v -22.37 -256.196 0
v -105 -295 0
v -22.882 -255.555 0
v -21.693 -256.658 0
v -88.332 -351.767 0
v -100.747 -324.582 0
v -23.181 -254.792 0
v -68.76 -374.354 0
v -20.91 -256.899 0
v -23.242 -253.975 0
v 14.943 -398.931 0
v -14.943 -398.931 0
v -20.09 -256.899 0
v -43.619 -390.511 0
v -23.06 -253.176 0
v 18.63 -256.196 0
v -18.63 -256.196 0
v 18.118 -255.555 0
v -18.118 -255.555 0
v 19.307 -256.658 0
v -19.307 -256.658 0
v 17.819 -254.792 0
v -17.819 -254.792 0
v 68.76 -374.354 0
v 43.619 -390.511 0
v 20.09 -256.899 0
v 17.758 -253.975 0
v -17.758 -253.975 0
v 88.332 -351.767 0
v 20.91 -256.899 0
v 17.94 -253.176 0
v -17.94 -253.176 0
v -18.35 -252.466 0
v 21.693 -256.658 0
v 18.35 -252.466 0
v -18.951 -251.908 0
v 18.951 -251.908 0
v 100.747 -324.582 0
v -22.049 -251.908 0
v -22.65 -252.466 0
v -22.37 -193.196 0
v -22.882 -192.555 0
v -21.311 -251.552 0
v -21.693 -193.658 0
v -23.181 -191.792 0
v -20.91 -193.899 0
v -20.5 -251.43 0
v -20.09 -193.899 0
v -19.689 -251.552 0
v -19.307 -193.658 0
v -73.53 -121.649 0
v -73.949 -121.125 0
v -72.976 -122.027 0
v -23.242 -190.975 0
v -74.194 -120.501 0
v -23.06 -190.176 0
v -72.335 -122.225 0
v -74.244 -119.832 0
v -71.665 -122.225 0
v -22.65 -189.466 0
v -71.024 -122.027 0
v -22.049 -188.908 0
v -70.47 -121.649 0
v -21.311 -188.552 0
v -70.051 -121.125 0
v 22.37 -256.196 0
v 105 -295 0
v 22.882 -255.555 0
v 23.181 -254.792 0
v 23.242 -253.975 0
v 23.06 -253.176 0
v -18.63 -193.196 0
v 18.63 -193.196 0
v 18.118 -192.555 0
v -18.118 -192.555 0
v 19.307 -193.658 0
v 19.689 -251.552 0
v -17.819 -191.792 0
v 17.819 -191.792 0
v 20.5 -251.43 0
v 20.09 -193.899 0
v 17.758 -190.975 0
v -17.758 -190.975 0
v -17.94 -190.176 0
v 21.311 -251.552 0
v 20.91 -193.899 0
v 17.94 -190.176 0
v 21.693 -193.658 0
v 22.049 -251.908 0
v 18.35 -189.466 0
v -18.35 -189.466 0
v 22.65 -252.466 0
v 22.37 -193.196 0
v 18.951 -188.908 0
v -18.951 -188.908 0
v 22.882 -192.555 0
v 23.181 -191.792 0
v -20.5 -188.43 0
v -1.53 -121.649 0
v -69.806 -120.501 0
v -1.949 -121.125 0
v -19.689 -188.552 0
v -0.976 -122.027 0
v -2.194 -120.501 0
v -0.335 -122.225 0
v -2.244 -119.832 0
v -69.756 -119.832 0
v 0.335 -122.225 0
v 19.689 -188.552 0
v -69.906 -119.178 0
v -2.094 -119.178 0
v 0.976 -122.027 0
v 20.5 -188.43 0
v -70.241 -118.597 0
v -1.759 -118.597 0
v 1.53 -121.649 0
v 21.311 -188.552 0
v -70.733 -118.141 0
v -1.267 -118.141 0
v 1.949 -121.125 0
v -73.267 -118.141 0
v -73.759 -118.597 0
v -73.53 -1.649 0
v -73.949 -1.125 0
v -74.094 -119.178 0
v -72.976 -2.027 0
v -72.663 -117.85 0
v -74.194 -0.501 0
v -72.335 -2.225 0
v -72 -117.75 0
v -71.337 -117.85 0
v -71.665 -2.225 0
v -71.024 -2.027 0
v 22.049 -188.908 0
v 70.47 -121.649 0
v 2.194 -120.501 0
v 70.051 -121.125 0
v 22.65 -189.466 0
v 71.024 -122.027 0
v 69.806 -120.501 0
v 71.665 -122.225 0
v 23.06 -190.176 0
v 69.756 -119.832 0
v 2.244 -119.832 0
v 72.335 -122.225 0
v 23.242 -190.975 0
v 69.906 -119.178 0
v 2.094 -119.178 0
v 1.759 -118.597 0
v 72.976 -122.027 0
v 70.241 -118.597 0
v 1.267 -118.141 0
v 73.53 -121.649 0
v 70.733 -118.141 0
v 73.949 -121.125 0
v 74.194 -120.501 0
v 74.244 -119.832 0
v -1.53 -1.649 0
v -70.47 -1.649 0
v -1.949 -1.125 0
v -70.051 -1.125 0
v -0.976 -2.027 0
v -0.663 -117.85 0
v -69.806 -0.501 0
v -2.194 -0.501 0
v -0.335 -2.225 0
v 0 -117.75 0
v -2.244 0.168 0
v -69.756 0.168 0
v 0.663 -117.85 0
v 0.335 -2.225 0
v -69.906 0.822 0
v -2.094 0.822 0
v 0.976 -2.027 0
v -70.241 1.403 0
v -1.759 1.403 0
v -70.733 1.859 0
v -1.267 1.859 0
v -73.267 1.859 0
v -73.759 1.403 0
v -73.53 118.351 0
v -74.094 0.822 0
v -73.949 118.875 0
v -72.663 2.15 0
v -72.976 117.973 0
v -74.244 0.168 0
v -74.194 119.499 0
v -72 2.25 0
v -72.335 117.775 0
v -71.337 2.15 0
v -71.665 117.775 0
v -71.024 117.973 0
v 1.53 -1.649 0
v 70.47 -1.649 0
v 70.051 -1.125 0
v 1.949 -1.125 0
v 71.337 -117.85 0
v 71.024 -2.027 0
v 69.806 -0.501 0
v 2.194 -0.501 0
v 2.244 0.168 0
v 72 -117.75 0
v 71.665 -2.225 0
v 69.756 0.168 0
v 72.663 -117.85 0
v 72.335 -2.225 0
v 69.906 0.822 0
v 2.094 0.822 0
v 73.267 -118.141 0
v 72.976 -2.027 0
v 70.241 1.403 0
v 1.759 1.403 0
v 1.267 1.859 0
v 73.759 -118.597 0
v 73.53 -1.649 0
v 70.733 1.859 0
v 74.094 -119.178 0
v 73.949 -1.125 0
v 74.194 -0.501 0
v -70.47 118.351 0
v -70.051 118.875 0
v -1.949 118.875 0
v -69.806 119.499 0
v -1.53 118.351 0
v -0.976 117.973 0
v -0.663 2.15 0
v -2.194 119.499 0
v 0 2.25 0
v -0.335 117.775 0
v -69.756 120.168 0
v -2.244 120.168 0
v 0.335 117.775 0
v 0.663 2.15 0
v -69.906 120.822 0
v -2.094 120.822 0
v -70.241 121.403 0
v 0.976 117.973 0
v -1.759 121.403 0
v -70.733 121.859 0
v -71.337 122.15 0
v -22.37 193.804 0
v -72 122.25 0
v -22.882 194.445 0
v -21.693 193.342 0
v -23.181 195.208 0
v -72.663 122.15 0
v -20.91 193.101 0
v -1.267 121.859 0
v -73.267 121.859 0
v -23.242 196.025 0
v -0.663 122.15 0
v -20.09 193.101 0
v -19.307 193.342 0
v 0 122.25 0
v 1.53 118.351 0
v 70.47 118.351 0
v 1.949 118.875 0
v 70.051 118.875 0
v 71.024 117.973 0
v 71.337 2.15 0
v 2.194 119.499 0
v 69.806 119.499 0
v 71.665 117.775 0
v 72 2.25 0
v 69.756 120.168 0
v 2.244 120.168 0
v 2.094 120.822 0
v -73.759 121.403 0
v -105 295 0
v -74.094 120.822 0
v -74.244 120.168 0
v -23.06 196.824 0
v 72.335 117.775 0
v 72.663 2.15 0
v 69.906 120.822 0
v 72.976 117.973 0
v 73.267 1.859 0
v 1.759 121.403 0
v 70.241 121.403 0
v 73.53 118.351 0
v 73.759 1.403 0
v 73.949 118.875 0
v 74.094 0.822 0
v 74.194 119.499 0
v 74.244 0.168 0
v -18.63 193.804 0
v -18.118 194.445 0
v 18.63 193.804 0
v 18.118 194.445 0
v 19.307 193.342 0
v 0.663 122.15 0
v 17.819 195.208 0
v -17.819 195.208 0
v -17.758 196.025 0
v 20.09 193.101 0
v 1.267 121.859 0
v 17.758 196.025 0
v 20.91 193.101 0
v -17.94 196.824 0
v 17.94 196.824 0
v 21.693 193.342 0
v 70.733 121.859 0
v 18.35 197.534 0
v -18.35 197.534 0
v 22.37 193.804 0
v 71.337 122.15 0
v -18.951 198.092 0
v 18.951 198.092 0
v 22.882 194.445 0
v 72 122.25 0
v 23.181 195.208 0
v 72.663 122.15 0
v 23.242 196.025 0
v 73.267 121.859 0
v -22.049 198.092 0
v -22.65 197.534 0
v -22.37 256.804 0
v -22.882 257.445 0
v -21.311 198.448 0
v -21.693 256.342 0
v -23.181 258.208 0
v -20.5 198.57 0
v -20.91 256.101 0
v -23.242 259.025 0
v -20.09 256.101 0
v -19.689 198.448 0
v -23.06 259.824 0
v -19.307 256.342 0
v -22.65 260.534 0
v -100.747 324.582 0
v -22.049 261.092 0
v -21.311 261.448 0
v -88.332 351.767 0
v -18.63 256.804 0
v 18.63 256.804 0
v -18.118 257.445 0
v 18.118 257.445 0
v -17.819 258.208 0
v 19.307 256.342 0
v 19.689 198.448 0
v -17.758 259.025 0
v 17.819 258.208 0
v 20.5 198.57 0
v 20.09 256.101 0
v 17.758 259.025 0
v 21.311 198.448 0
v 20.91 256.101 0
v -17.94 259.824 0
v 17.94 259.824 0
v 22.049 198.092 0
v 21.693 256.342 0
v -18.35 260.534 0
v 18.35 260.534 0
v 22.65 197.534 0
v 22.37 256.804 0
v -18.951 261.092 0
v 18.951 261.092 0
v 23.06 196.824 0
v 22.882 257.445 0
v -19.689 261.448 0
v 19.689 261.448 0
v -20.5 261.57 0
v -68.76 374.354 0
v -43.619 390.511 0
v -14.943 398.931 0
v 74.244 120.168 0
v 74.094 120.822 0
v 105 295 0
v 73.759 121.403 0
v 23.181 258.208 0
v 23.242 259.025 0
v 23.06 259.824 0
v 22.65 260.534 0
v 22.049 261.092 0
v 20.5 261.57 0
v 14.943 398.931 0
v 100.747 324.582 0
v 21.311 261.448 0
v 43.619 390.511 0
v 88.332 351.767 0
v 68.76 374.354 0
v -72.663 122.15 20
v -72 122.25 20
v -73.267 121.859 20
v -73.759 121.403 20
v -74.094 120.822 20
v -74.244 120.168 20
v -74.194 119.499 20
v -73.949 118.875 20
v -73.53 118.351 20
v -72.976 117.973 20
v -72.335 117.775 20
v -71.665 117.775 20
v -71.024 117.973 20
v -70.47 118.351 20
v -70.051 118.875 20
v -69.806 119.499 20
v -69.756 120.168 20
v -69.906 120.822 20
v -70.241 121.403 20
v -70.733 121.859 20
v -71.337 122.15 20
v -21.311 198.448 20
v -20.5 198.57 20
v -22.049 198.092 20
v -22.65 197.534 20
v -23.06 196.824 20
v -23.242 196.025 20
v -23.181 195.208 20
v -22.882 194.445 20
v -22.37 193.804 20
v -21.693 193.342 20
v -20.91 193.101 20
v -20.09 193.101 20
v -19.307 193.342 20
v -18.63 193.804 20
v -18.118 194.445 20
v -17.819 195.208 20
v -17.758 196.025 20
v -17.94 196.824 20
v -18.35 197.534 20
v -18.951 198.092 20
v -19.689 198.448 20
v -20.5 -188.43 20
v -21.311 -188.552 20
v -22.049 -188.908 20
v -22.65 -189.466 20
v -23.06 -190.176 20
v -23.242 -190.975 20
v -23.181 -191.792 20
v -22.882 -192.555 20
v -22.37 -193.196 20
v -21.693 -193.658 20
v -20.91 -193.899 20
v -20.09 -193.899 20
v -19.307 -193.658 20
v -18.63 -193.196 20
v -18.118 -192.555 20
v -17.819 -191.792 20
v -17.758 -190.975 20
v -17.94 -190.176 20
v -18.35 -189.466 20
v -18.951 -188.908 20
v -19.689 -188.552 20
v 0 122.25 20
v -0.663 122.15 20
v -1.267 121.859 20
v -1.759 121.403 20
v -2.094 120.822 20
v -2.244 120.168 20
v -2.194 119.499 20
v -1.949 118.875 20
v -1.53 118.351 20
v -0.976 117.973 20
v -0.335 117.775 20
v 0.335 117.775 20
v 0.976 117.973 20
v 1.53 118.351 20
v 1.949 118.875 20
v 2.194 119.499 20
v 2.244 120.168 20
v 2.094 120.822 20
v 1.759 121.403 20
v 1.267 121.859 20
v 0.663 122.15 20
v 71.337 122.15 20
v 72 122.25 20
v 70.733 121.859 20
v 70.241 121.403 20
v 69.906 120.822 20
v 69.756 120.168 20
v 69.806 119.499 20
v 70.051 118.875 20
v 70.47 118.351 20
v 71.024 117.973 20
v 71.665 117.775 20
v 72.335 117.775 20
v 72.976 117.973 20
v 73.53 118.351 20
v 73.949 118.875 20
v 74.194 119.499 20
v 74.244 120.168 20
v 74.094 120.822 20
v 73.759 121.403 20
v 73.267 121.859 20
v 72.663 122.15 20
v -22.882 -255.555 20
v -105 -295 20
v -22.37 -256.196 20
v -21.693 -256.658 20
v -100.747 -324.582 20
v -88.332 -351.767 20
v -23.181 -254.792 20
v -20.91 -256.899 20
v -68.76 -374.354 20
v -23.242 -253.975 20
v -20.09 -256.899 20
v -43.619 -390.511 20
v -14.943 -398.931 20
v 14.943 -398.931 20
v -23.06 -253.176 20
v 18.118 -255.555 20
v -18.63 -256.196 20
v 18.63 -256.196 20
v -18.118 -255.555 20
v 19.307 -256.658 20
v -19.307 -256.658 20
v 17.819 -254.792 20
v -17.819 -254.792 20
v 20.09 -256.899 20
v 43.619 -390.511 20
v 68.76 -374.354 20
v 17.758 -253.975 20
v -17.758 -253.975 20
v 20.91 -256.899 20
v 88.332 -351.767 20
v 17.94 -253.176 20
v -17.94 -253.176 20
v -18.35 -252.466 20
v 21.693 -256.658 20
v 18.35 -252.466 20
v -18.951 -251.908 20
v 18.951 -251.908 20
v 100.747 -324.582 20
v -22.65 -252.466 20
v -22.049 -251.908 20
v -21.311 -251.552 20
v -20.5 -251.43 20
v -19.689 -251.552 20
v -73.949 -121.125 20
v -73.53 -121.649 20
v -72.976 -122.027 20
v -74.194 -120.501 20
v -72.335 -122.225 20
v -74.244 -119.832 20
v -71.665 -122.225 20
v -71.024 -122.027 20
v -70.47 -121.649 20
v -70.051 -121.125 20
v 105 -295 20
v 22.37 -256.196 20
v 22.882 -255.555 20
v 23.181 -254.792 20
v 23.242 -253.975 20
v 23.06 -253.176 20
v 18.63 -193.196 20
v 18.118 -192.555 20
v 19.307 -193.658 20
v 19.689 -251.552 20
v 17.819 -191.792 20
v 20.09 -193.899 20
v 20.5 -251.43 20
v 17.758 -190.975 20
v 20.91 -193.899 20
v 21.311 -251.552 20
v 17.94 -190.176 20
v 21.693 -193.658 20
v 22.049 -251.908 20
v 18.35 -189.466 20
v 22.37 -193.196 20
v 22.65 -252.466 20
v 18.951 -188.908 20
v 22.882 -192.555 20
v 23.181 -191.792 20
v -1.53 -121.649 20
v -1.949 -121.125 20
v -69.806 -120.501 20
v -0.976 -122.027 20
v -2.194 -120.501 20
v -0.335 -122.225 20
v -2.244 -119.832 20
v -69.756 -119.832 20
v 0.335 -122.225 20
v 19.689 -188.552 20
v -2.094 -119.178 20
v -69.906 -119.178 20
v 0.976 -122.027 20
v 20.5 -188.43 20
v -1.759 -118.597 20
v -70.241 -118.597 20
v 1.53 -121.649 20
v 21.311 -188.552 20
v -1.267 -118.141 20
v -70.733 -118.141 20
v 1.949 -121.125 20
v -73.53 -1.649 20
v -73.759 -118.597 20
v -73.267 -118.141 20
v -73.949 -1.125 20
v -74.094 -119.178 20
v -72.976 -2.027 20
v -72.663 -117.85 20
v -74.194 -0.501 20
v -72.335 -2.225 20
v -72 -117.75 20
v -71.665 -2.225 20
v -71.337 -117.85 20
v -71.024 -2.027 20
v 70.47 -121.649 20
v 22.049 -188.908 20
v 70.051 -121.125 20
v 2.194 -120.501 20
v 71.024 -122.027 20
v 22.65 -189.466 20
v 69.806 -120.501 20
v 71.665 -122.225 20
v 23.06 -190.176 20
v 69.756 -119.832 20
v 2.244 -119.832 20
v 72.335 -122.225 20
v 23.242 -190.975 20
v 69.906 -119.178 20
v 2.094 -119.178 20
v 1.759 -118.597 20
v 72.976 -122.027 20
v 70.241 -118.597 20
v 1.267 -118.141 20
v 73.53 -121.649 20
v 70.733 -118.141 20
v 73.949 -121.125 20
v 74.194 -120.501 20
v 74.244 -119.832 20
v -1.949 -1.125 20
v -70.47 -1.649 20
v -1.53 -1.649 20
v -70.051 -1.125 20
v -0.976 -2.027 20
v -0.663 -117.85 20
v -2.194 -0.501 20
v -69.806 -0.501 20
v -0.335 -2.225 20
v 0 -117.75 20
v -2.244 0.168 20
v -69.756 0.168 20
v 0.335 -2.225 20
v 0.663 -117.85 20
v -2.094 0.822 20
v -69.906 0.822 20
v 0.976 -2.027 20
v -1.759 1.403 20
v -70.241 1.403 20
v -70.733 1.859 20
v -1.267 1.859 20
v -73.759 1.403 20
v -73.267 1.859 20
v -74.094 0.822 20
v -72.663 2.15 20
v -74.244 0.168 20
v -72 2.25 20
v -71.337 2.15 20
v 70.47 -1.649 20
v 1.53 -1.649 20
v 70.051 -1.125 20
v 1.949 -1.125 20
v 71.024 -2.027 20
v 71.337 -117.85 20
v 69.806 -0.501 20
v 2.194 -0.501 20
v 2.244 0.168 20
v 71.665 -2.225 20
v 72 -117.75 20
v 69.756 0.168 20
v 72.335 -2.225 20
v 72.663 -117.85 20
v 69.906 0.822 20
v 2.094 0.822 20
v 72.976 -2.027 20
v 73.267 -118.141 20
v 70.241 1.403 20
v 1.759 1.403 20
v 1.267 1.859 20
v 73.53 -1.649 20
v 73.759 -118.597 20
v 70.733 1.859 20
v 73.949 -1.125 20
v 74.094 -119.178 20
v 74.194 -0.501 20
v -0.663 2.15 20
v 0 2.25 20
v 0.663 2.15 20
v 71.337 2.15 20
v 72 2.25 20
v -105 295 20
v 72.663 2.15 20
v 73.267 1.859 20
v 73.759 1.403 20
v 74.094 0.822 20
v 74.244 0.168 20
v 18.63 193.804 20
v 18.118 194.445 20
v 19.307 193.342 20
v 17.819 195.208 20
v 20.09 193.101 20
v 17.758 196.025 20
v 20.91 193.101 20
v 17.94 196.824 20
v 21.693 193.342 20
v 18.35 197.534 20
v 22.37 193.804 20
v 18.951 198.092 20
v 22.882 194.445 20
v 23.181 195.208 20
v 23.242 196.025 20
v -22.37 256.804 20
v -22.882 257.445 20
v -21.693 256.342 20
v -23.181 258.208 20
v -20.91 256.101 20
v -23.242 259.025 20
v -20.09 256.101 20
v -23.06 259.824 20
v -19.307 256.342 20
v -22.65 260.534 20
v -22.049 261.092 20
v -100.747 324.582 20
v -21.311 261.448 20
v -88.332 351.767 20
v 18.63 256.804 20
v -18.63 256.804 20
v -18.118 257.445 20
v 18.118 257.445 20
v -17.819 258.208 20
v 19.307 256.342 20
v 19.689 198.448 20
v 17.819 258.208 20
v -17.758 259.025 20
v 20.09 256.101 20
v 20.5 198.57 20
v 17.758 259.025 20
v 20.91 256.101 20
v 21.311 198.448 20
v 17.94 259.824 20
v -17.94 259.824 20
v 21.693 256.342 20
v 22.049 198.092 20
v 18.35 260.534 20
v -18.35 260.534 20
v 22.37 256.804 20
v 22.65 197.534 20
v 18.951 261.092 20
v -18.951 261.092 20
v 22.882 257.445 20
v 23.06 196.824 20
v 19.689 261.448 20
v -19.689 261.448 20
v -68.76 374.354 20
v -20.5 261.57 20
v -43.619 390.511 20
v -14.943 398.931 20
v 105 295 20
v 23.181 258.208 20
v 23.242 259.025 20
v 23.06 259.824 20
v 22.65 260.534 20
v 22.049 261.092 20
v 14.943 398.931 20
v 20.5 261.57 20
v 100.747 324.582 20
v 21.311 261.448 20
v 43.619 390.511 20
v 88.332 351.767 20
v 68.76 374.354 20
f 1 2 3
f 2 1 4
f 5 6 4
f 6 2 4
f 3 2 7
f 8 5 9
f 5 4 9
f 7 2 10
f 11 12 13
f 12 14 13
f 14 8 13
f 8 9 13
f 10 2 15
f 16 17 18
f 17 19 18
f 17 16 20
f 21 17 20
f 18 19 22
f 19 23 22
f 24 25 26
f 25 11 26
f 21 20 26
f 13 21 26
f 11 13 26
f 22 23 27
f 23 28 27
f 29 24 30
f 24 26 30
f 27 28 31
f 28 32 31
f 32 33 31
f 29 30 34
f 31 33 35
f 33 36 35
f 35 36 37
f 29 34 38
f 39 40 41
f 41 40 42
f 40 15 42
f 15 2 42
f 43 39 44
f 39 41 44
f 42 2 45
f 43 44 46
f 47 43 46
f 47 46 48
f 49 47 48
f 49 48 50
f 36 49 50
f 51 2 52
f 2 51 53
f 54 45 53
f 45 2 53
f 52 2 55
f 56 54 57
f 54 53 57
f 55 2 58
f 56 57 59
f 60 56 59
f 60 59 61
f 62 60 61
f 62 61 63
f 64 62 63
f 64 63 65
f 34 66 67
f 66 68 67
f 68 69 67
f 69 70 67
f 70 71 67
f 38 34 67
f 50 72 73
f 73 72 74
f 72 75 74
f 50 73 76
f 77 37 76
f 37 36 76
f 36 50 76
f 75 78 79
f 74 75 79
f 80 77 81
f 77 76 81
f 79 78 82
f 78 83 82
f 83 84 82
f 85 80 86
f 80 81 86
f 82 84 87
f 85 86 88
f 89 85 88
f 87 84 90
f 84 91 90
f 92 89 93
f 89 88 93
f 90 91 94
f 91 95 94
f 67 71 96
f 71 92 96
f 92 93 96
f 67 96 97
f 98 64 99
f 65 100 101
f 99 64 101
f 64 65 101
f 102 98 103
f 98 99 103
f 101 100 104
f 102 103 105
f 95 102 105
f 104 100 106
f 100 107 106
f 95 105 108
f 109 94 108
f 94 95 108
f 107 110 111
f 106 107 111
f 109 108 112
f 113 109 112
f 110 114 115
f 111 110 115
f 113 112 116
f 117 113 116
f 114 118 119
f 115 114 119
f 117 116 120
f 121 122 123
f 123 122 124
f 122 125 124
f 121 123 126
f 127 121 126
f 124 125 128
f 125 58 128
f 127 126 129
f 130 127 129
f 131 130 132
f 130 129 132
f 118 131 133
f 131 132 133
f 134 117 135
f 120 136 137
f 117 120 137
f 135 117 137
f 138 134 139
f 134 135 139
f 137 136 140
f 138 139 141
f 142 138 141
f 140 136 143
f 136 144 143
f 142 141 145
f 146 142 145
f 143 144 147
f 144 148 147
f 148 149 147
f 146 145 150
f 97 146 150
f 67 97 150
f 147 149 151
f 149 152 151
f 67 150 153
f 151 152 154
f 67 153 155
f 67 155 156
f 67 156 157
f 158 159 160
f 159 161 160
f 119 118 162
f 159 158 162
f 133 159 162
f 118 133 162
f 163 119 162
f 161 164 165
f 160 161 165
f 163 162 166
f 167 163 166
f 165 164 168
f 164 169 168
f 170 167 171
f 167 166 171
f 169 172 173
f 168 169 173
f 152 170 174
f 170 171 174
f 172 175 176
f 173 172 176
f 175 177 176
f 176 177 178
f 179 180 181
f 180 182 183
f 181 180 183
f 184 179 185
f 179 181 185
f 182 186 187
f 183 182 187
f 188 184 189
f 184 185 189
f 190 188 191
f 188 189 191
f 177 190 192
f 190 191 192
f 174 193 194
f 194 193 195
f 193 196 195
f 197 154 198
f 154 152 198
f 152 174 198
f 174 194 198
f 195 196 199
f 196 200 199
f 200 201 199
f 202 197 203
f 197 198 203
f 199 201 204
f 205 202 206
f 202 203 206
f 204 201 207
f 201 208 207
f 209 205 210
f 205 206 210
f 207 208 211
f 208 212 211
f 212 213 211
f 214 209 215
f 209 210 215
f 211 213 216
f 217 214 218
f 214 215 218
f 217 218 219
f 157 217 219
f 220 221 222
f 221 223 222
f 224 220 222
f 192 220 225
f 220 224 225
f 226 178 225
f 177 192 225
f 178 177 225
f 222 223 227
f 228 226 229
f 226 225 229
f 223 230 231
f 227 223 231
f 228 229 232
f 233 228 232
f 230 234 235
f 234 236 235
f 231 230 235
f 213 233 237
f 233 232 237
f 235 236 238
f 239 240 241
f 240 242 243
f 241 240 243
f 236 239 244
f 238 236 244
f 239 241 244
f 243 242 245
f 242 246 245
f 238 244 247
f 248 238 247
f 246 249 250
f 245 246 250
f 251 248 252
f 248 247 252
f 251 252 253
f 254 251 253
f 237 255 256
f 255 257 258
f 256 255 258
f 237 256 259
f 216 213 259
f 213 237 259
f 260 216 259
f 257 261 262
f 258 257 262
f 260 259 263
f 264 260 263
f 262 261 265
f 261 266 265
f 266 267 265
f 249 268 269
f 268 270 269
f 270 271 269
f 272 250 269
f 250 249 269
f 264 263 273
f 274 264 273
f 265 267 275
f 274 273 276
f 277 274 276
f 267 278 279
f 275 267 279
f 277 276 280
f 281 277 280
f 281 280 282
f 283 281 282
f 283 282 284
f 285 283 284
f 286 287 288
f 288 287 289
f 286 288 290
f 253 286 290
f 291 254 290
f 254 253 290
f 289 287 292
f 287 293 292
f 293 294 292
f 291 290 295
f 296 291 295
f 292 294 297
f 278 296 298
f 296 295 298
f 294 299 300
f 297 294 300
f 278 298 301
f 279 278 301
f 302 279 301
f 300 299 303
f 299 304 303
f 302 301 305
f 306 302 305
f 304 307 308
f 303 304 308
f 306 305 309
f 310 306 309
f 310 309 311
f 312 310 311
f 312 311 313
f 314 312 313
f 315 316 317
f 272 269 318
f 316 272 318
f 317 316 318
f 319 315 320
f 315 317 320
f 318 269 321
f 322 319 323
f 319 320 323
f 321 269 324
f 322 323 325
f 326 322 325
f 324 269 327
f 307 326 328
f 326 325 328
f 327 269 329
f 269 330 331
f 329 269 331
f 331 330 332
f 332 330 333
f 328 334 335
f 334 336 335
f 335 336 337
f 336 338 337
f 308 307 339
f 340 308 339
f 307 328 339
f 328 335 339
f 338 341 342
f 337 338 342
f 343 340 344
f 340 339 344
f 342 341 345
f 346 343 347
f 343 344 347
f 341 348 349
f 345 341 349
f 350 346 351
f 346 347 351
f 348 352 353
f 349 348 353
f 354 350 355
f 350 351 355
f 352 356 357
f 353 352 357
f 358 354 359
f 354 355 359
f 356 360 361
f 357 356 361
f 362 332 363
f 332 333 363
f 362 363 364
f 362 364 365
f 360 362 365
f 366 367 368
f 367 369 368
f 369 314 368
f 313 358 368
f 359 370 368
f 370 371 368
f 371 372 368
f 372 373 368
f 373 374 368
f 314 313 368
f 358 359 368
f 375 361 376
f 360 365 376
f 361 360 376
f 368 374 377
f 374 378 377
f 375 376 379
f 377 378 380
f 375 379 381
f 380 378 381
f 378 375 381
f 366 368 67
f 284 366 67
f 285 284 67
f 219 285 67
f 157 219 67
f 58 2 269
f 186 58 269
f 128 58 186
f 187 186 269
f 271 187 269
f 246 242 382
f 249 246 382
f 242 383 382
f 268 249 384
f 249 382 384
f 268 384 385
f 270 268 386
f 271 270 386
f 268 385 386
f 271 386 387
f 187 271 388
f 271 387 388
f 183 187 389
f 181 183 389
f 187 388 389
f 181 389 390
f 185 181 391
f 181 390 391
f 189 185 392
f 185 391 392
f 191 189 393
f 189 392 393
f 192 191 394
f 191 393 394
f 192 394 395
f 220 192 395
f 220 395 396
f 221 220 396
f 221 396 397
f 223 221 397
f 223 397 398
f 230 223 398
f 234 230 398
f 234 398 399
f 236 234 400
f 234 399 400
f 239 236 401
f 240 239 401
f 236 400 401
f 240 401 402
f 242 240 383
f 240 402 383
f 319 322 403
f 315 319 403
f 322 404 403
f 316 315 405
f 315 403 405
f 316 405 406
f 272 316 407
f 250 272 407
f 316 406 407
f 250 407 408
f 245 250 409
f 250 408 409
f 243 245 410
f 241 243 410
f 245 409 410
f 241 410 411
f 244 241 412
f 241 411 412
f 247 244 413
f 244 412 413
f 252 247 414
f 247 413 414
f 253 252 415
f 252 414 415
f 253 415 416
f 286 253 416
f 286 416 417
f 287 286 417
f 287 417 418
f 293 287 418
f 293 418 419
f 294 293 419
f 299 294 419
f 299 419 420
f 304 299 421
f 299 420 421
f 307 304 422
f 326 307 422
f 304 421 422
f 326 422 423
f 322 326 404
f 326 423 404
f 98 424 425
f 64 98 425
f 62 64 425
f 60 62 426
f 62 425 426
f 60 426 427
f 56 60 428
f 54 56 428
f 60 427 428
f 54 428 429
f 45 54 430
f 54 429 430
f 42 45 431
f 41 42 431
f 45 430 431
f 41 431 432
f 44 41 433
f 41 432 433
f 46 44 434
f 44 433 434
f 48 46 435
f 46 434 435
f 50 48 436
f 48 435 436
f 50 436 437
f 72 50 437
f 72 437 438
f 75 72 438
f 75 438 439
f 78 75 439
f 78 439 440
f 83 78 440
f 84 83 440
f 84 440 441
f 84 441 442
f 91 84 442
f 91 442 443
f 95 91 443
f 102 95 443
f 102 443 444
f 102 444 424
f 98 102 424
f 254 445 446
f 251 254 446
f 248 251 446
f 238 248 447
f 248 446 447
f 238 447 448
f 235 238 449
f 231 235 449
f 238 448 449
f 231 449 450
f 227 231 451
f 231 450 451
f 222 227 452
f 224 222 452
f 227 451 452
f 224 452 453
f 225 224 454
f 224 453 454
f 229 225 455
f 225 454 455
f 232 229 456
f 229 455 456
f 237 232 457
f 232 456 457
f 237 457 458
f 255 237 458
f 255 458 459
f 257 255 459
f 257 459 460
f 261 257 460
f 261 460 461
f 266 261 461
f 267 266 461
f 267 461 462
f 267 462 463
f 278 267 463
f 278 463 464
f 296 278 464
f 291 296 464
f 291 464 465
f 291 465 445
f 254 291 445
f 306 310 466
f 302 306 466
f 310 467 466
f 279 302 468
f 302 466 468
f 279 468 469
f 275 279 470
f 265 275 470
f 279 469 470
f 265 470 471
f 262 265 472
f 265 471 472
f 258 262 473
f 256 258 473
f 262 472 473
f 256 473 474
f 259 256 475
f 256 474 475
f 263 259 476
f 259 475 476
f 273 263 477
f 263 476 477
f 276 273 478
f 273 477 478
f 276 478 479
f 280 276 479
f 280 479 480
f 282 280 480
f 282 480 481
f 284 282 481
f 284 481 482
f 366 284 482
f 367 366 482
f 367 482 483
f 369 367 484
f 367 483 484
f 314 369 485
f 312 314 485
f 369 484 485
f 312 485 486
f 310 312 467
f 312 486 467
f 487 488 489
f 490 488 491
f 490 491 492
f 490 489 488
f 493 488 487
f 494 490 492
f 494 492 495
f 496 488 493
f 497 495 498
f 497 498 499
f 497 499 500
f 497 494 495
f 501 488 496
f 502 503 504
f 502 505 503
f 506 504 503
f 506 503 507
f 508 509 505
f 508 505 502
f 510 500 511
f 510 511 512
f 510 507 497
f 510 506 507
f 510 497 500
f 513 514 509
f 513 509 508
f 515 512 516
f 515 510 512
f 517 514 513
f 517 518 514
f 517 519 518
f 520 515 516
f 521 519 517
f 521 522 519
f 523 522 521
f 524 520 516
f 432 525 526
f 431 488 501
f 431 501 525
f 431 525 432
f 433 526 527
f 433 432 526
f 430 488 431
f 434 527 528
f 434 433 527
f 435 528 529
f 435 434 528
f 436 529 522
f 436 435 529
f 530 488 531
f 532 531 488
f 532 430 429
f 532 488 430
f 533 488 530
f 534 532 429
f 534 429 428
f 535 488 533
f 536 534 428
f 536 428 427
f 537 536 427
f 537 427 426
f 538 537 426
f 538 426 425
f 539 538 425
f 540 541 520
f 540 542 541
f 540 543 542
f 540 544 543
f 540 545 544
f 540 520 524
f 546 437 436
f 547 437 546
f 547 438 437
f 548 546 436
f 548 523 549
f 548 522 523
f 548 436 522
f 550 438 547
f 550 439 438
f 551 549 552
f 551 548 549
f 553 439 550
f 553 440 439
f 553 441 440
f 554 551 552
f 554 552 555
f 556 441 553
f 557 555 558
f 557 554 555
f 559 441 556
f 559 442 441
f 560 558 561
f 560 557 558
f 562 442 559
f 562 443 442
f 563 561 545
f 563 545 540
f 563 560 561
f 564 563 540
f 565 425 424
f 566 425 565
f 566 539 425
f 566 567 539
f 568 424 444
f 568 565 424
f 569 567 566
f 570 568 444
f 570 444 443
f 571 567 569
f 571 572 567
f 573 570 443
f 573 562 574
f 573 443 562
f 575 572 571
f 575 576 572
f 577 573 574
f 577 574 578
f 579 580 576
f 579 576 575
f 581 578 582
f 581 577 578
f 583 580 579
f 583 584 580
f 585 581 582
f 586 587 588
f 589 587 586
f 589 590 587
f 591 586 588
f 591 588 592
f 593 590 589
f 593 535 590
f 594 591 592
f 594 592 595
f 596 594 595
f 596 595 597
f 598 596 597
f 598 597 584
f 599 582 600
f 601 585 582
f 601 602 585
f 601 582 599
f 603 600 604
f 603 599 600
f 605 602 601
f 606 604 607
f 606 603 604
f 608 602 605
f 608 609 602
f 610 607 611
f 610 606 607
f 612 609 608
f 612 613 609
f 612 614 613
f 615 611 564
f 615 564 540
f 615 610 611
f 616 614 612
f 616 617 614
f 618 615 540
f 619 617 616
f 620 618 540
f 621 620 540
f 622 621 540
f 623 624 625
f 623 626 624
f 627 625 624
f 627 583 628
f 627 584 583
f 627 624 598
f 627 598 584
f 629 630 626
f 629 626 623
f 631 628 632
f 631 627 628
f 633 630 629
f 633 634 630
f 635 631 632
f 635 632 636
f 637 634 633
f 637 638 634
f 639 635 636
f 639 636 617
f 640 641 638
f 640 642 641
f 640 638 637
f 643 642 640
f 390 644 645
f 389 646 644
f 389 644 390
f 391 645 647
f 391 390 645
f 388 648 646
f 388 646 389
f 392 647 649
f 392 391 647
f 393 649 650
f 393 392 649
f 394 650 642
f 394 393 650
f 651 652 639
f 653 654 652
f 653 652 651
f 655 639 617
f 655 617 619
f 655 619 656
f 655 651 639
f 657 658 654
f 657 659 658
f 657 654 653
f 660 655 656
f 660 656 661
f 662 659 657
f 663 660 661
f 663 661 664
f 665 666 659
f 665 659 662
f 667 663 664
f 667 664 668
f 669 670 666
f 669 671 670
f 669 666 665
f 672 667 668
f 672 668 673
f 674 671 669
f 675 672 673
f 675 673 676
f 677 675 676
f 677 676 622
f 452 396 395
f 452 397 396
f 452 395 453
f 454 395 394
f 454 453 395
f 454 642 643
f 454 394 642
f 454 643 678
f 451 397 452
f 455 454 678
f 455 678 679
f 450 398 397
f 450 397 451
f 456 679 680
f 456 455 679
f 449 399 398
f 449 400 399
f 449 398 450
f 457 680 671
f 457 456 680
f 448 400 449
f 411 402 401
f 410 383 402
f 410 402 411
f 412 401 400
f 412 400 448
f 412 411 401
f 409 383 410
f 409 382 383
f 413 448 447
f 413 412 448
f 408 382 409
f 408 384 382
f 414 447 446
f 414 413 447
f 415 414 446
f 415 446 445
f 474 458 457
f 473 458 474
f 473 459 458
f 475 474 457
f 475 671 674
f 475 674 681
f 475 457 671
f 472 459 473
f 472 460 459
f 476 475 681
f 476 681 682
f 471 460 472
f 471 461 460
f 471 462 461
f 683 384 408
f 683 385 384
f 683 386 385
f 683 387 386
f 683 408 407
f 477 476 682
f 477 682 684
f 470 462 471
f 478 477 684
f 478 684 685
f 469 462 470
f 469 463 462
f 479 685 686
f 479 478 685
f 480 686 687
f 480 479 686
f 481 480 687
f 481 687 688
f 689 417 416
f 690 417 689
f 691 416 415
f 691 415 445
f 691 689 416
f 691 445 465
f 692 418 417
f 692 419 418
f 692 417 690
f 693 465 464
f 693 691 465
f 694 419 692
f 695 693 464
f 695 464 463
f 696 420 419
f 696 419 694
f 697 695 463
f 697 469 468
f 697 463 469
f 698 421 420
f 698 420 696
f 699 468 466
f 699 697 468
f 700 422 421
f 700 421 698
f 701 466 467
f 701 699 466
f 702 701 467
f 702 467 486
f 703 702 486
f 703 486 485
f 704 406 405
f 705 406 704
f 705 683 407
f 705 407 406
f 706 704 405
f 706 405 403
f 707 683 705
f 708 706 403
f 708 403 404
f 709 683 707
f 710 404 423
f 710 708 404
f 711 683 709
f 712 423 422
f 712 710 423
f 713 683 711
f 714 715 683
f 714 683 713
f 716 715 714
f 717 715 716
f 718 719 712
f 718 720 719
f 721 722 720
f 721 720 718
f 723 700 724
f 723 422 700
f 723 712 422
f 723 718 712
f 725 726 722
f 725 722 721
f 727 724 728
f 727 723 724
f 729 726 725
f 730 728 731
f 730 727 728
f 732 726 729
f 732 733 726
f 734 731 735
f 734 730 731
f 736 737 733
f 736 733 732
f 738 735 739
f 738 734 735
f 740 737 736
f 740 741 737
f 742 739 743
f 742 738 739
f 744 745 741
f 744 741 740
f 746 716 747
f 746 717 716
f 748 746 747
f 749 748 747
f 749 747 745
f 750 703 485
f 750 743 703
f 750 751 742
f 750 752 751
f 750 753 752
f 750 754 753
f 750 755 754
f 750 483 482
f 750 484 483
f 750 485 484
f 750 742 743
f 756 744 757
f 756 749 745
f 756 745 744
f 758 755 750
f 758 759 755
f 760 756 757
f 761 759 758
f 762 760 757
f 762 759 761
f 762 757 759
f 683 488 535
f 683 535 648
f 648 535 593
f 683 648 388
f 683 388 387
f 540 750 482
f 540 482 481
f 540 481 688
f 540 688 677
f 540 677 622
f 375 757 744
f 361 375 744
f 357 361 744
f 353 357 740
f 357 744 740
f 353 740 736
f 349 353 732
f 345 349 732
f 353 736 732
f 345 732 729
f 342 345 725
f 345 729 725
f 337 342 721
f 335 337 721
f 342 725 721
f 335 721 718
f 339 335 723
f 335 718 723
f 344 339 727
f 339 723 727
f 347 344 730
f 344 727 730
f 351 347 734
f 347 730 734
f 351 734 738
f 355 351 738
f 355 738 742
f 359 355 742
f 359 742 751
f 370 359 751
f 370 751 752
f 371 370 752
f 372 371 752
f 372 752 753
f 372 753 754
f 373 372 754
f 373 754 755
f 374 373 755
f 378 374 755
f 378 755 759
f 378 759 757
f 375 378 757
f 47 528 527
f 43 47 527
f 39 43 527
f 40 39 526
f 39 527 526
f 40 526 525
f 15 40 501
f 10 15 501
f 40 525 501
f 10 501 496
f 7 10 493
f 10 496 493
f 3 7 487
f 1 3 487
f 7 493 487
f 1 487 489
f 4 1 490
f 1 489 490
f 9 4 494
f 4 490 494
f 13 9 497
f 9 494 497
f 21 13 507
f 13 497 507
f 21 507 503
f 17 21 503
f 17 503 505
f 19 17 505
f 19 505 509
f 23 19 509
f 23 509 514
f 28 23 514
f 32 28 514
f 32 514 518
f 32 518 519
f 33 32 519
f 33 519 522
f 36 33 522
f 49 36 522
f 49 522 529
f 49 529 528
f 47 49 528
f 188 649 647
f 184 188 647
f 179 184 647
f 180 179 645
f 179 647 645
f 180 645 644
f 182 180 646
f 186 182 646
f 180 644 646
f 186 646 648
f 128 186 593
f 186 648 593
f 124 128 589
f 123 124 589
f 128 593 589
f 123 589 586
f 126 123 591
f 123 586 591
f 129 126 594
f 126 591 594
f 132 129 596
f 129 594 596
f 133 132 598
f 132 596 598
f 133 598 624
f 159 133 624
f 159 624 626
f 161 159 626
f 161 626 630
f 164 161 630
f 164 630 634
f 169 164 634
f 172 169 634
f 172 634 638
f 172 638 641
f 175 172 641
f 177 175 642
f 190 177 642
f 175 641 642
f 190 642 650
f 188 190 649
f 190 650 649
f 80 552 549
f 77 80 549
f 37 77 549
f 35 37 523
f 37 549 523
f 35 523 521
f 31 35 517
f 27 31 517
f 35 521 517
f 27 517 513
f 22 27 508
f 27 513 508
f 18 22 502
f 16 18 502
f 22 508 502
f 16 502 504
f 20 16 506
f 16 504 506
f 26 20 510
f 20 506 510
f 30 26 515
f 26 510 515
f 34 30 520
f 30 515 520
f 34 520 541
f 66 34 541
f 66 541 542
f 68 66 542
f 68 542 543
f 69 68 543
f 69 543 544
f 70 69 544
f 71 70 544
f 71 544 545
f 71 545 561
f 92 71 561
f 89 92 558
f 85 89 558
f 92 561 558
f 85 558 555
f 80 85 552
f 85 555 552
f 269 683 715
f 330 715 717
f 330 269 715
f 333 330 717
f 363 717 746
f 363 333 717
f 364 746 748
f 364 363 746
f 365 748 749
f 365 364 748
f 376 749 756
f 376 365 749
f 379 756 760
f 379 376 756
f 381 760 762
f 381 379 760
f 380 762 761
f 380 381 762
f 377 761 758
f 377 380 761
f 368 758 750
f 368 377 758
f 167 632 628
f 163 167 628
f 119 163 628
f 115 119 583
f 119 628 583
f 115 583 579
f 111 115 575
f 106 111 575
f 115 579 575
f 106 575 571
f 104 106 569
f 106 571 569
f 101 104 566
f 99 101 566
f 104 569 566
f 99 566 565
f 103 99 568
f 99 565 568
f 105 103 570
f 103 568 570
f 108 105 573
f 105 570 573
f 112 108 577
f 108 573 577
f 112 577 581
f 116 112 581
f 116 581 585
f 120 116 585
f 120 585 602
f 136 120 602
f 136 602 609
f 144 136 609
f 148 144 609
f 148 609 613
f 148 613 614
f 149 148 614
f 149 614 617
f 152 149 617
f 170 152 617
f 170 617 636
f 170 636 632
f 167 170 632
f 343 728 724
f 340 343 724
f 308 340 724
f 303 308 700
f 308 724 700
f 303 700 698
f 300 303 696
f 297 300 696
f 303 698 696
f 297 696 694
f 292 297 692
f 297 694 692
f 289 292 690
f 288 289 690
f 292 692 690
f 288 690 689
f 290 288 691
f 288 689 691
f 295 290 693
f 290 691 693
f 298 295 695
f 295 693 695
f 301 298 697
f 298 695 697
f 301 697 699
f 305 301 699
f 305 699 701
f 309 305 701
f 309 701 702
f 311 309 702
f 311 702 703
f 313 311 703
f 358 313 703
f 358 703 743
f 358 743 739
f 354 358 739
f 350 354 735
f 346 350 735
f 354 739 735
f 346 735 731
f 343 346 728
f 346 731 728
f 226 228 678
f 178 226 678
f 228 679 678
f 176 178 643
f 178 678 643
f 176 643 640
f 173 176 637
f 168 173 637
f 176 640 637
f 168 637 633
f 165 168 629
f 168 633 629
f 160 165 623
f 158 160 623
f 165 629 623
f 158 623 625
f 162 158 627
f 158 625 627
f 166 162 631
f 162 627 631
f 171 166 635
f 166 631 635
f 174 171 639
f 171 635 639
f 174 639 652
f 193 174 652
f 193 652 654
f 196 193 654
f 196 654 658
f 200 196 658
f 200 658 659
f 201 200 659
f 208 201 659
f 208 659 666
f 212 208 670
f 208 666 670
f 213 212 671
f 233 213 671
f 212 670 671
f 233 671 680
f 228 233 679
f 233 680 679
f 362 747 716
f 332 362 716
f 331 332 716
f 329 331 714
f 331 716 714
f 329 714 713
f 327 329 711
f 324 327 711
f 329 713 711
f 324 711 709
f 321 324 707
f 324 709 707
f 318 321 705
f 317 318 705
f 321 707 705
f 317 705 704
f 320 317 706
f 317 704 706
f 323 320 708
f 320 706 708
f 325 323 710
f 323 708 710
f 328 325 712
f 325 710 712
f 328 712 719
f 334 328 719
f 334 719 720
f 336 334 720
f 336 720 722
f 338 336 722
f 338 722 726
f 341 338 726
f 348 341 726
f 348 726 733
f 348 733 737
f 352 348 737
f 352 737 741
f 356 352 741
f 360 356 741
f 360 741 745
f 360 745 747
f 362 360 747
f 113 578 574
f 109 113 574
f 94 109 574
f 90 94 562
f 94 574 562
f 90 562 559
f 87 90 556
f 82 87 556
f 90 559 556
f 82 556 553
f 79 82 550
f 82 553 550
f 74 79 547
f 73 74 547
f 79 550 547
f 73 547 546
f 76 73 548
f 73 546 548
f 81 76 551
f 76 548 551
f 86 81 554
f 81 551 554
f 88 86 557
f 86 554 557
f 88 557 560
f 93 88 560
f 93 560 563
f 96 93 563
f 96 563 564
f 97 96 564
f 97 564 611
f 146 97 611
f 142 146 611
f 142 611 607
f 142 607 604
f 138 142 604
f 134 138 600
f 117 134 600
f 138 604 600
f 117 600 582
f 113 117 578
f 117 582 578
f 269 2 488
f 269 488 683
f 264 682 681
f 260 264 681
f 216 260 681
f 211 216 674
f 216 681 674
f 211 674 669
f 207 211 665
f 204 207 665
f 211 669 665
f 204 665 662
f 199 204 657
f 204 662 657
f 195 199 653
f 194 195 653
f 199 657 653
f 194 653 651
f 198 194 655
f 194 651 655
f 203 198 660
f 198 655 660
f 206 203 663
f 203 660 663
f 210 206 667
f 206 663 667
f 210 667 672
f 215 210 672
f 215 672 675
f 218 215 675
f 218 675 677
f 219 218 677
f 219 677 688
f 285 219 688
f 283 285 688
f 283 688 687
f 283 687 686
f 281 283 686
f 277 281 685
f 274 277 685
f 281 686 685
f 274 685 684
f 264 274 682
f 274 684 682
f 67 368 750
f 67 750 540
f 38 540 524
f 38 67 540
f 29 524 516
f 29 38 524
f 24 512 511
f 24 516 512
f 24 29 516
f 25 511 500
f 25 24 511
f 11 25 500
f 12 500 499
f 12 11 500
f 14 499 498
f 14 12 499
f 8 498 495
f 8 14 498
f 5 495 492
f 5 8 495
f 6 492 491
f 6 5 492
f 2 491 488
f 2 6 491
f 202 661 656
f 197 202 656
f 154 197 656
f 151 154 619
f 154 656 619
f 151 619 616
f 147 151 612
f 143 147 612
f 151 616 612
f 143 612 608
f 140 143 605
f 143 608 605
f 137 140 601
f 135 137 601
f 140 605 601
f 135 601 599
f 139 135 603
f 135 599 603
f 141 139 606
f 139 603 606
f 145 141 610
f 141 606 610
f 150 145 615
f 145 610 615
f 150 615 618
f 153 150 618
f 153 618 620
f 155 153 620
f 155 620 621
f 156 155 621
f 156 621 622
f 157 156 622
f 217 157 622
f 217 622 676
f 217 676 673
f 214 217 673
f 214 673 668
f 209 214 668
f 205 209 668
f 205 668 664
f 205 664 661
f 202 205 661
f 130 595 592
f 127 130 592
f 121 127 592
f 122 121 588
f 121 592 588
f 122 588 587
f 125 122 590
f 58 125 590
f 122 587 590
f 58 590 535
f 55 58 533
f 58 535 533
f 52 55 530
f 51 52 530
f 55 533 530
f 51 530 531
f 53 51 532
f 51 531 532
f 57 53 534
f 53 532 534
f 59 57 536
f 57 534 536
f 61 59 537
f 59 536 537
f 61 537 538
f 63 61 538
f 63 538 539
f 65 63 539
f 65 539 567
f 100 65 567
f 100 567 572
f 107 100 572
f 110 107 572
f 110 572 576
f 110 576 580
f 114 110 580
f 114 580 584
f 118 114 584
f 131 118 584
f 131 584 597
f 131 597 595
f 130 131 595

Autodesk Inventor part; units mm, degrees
ref_plane "作業平面1" through (6614.749, 337.2794, 0) normal (0, 0, 1) x (1, 0, 0)
sketch "スケッチ1" plane through (6614.749, 337.2794, 0) normal (0, 0, 1) x (1, 0, 0)
  line L0 (-6509.749, -42.2794) -> (-6509.749, -632.2794)
  line L1 (-6509.749, -632.2794) -> (-6719.749, -632.2794)
  line L2 (-6719.749, -632.2794) -> (-6719.749, -42.2794)
  line L3 (-6719.749, -42.2794) -> (-6509.749, -42.2794)
  arc A0 (-6509.749, -42.2794) -> (-6719.749, -42.2794) centre (-6614.749, -42.2794) ccw
  arc A1 (-6719.749, -632.2794) -> (-6509.749, -632.2794) centre (-6614.749, -632.2794) ccw
  line L4 (-6614.749, -897.2794) -> (-6614.749, 222.7206) projected
  line L5 (-8036.2537, -337.2794) -> (1179.2797, -337.2794) projected
  line L6 (-6509.749, -337.2794) -> (-137.2251, -337.2794)
  point P0 (-6614.749, -337.2794)
  dimension "d1" = 210
  dimension "d3" = 105
  dimension "d4" = 590
  dimension "d5" = 105
  dimension "d8" = 295
extrude "押し出し1" add sketch "スケッチ1" along normal blind 20
sketch "スケッチ2" plane through (6614.749, 337.2794, 0) normal (0, 0, -1) x (-1, 0, 0)
  spline S0 degree 3 poles (6630.8363, -557.2765) (6630.8356, -556.4314) (6630.8307, -555.5861) (6630.7821, -551.1548) (6630.6652, -547.5706) (6630.2129, -540.6292) (6629.8924, -537.269) (6629.059, -531.5504) (6628.6277, -529.1809) (6627.5, -524.5004) (6626.8057, -522.1844) (6625.8839, -519.9595) knots -3.785676 -3.785676 -3.785676 -3.785676 -3.532131 -3.532131 -2.4562 -2.4562 -1.444966 -1.444966 -0.722485 -0.722485 0 0 0 0 projected
  spline S1 degree 3 poles (6630.0302, -579.9499) (6630.1435, -578.1819) (6630.247, -576.4134) (6630.4408, -572.7081) (6630.5289, -570.7713) (6630.6019, -568.834) (6630.6759, -566.8669) (6630.7344, -564.8993) (6630.8129, -561.0466) (6630.8346, -559.1616) (6630.8363, -557.2765) knots -2.294162 -2.294162 -2.294162 -2.294162 -1.762693 -1.762693 -1.181069 -1.181069 -1.181069 -0.590534 -0.590534 -0.025021 -0.025021 -0.025021 -0.025021 projected
  spline S2 degree 3 poles (6629.9005, -581.946) (6629.933, -581.4474) (6629.9654, -580.9489) (6629.9979, -580.4504) (6630.0033, -580.367) (6630.0087, -580.2836) (6630.0195, -580.1167) (6630.0249, -580.0333) (6630.0302, -579.9499) knots -0.65131 -0.65131 -0.65131 -0.65131 -0.501438 -0.501438 -0.501438 -0.47636 -0.47636 -0.451282 -0.451282 -0.451282 -0.451282 projected
  ellipse E0 centre (6627.749, -583.7463) end of major axis (6627.749, -580.2108) minor radius 2.5 (6630.249, -583.7463) -> (6629.9005, -581.946) ccw projected
  line L0 (6630.249, -596.9595) -> (6630.249, -583.7463) projected
  line L1 (6640.249, -596.9595) -> (6630.249, -596.9595) projected
  arc A0 (6640.249, -596.9595) -> (6641.749, -595.4595) centre (6640.249, -595.4595) ccw projected
  line L2 (6641.749, -521.4595) -> (6641.749, -595.4595) projected
  arc A1 (6641.749, -521.4595) -> (6640.249, -519.9595) centre (6640.249, -521.4595) ccw projected
  line L3 (6625.8839, -519.9595) -> (6640.249, -519.9595) projected
  circle A2 centre (6635.249, -591.4595) radius 3 projected
  circle A3 centre (6635.249, -528.4595) radius 3 projected
  circle A4 centre (6594.249, -591.4595) radius 3 projected
  circle A5 centre (6594.249, -528.4595) radius 3 projected
  spline S3 degree 3 poles (6599.4677, -579.9499) (6599.473, -580.0333) (6599.4784, -580.1167) (6599.4892, -580.2836) (6599.4946, -580.367) (6599.5, -580.4504) (6599.5325, -580.9489) (6599.5649, -581.4474) (6599.5974, -581.946) knots -0.050156 -0.050156 -0.050156 -0.050156 -0.025078 -0.025078 0 0 0 0.149872 0.149872 0.149872 0.149872 projected
  spline S4 degree 3 poles (6598.6616, -557.2765) (6598.6633, -559.1539) (6598.6848, -561.0313) (6598.7628, -564.8687) (6598.8208, -566.8287) (6598.8943, -568.7881) (6598.9673, -570.7332) (6599.0556, -572.6776) (6599.25, -576.3981) (6599.3539, -578.1743) (6599.4677, -579.9499) knots -2.319296 -2.319296 -2.319296 -2.319296 -1.756075 -1.756075 -1.167834 -1.167834 -1.167834 -0.583917 -0.583917 -0.050156 -0.050156 -0.050156 -0.050156 projected
  spline S5 degree 3 poles (6603.614, -519.9595) (6602.3019, -523.1265) (6601.4408, -526.4662) (6600.1974, -532.85) (6599.7845, -535.9073) (6599.0649, -543.0901) (6598.8445, -547.2235) (6598.6873, -553.3316) (6598.6634, -555.3041) (6598.6616, -557.2765) knots -3.810629 -3.810629 -3.810629 -3.810629 -2.782212 -2.782212 -1.858006 -1.858006 -0.616716 -0.616716 -0.024978 -0.024978 -0.024978 -0.024978 projected
  line L4 (6589.249, -519.9595) -> (6603.614, -519.9595) projected
  arc A6 (6589.249, -519.9595) -> (6587.749, -521.4595) centre (6589.249, -521.4595) ccw projected
  line L5 (6587.749, -595.4595) -> (6587.749, -521.4595) projected
  arc A7 (6587.749, -595.4595) -> (6589.249, -596.9595) centre (6589.249, -595.4595) ccw projected
  line L6 (6599.249, -596.9595) -> (6589.249, -596.9595) projected
  line L7 (6599.249, -583.7463) -> (6599.249, -596.9595) projected
  ellipse E1 centre (6601.749, -583.7463) end of major axis (6601.749, -580.2108) minor radius 2.5 (6599.5974, -581.946) -> (6599.249, -583.7463) ccw projected
  spline S6 degree 3 poles (6630.8363, -107.2765) (6630.8356, -106.4314) (6630.8307, -105.5861) (6630.7821, -101.1548) (6630.6652, -97.5706) (6630.2129, -90.6292) (6629.8924, -87.269) (6629.059, -81.5504) (6628.6277, -79.1809) (6627.5, -74.5004) (6626.8057, -72.1844) (6625.8839, -69.9595) knots -3.785676 -3.785676 -3.785676 -3.785676 -3.532131 -3.532131 -2.4562 -2.4562 -1.444966 -1.444966 -0.722485 -0.722485 0 0 0 0 projected
  spline S7 degree 3 poles (6630.0302, -129.9499) (6630.1435, -128.1819) (6630.247, -126.4134) (6630.4408, -122.7081) (6630.5289, -120.7713) (6630.6019, -118.834) (6630.6759, -116.8669) (6630.7344, -114.8993) (6630.8129, -111.0466) (6630.8346, -109.1616) (6630.8363, -107.2765) knots -2.294162 -2.294162 -2.294162 -2.294162 -1.762693 -1.762693 -1.181069 -1.181069 -1.181069 -0.590534 -0.590534 -0.025021 -0.025021 -0.025021 -0.025021 projected
  spline S8 degree 3 poles (6629.9005, -131.946) (6629.933, -131.4474) (6629.9654, -130.9489) (6629.9979, -130.4504) (6630.0033, -130.367) (6630.0087, -130.2836) (6630.0195, -130.1167) (6630.0249, -130.0333) (6630.0302, -129.9499) knots -0.65131 -0.65131 -0.65131 -0.65131 -0.501438 -0.501438 -0.501438 -0.47636 -0.47636 -0.451282 -0.451282 -0.451282 -0.451282 projected
  ellipse E2 centre (6627.749, -133.7463) end of major axis (6627.749, -130.2108) minor radius 2.5 (6630.249, -133.7463) -> (6629.9005, -131.946) ccw projected
  line L8 (6630.249, -146.9595) -> (6630.249, -133.7463) projected
  line L9 (6640.249, -146.9595) -> (6630.249, -146.9595) projected
  arc A8 (6640.249, -146.9595) -> (6641.749, -145.4595) centre (6640.249, -145.4595) ccw projected
  line L10 (6641.749, -71.4595) -> (6641.749, -145.4595) projected
  arc A9 (6641.749, -71.4595) -> (6640.249, -69.9595) centre (6640.249, -71.4595) ccw projected
  line L11 (6625.8839, -69.9595) -> (6640.249, -69.9595) projected
  circle A10 centre (6635.249, -141.4595) radius 3 projected
  circle A11 centre (6635.249, -78.4595) radius 3 projected
  circle A12 centre (6594.249, -141.4595) radius 3 projected
  circle A13 centre (6594.249, -78.4595) radius 3 projected
  spline S9 degree 3 poles (6599.4677, -129.9499) (6599.473, -130.0333) (6599.4784, -130.1167) (6599.4892, -130.2836) (6599.4946, -130.367) (6599.5, -130.4504) (6599.5325, -130.9489) (6599.5649, -131.4474) (6599.5974, -131.946) knots -0.050156 -0.050156 -0.050156 -0.050156 -0.025078 -0.025078 0 0 0 0.149872 0.149872 0.149872 0.149872 projected
  spline S10 degree 3 poles (6598.6616, -107.2765) (6598.6633, -109.1539) (6598.6848, -111.0313) (6598.7628, -114.8687) (6598.8208, -116.8287) (6598.8943, -118.7881) (6598.9673, -120.7332) (6599.0556, -122.6776) (6599.25, -126.3981) (6599.3539, -128.1743) (6599.4677, -129.9499) knots -2.319296 -2.319296 -2.319296 -2.319296 -1.756075 -1.756075 -1.167834 -1.167834 -1.167834 -0.583917 -0.583917 -0.050156 -0.050156 -0.050156 -0.050156 projected
  spline S11 degree 3 poles (6603.614, -69.9595) (6602.3019, -73.1265) (6601.4408, -76.4662) (6600.1974, -82.85) (6599.7845, -85.9073) (6599.0649, -93.0901) (6598.8445, -97.2235) (6598.6873, -103.3316) (6598.6634, -105.3041) (6598.6616, -107.2765) knots -3.810629 -3.810629 -3.810629 -3.810629 -2.782212 -2.782212 -1.858006 -1.858006 -0.616716 -0.616716 -0.024978 -0.024978 -0.024978 -0.024978 projected
  line L12 (6589.249, -69.9595) -> (6603.614, -69.9595) projected
  arc A14 (6589.249, -69.9595) -> (6587.749, -71.4595) centre (6589.249, -71.4595) ccw projected
  line L13 (6587.749, -145.4595) -> (6587.749, -71.4595) projected
  arc A15 (6587.749, -145.4595) -> (6589.249, -146.9595) centre (6589.249, -145.4595) ccw projected
  line L14 (6599.249, -146.9595) -> (6589.249, -146.9595) projected
  line L15 (6599.249, -133.7463) -> (6599.249, -146.9595) projected
  ellipse E3 centre (6601.749, -133.7463) end of major axis (6601.749, -130.2108) minor radius 2.5 (6599.5974, -131.946) -> (6599.249, -133.7463) ccw projected
  point P0 (6614.749, -337.2794)
hole "穴1" at (-20.5, -191.1802, 0) at (20.5, -191.1802, 0) at (20.5, -254.1802, 0) at (-20.5, -254.1802, 0) at (-20.5, 258.8198, 0) at (20.5, 258.8198, 0) at (-20.5, 195.8198, 0) at (20.5, 195.8198, 0) direction (0, 0, 1) diameter 5.5 end through all
sketch "スケッチ4" plane through (0, 0, 0) normal (0, 0, 1) x (1, 0, 0)
  circle A0 centre (-20.5, 195.8198) radius 2.75 projected
  circle A1 centre (-20.5, 258.8198) radius 2.75 projected
  circle A2 centre (20.5, -254.1802) radius 2.75 projected
  circle A3 centre (-20.5, -191.1802) radius 2.75 projected
  circle A4 centre (20.5, -191.1802) radius 2.75 projected
  circle A5 centre (-20.5, -254.1802) radius 2.75 projected
  circle A6 centre (20.5, 258.8198) radius 2.75 projected
  circle A7 centre (20.5, 195.8198) radius 2.75 projected
  arc A8 (105, 295) -> (-105, 295) centre (0, 295) ccw projected
  line L0 (-105, 295) -> (-105, -295) projected
  arc A9 (-105, -295) -> (105, -295) centre (0, -295) ccw projected
  line L1 (105, -295) -> (105, 295) projected
  line L2 (65, -50) -> (65, 50)
  line L3 (30, 50) -> (30, -50)
  line L4 (30, -50) -> (65, 50) construction
  line L5 (65, -50) -> (30, 50) construction
  arc A10 (30, -50) -> (65, -50) centre (47.5, -40.3175) ccw
  line L6 (-147, 0) -> (147, 0) projected
  arc A11 (65, 50) -> (30, 50) centre (47.5, 40.3175) ccw
  point P0 (0, 0)
  point P1 (47.5, 0)
  dimension "d16" = 35
  dimension "d17" = 100
  dimension "d18" = 40
  dimension "d19" = 20
  dimension "d20" = 20
extrude "押し出し2" [suppressed]
sketch "スケッチ6" plane through (6614.749, 337.2794, 0) normal (0, 0, -1) x (-1, 0, 0)
  line L0 (6467.749, -337.2794) -> (6761.749, -337.2794) projected
  line L1 (6614.749, -897.2794) -> (6614.749, 222.7206) projected
  point P0 (6614.749, -337.2794)
  point P1 (6614.749, -337.2794)
  point P2 (6542.749, -337.2794)
  point P3 (6542.749, -457.2794)
  point P4 (6614.749, -457.2794)
  point P5 (6614.749, -337.2794)
  point P6 (6542.749, -217.2794)
  point P7 (6614.749, -217.2794)
  point P8 (6686.749, -337.2794)
  point P9 (6686.749, -457.2794)
  point P10 (6686.749, -217.2794)
  dimension "d23" = 120
  dimension "d24" = 72
  dimension "d25" = 72
hole "穴2" at (0, 0, 0) at (72, 0, 0) at (72, -120, 0) at (0, -120, 0) at (0, 120, 0) at (72, 120, 0) at (-72, -120, 0) at (-72, 0, 0) at (-72, 120, 0) direction (0, 0, 1) diameter 4.5 end through all
equation "\"d5\" = 0.5 * d1"
equation "\"d8\" = 0.5 * d4"
equation "\"d20\" = d19"
equation "\"d25\" = d24"
properties part number "board" material "木材(サクラ)"
